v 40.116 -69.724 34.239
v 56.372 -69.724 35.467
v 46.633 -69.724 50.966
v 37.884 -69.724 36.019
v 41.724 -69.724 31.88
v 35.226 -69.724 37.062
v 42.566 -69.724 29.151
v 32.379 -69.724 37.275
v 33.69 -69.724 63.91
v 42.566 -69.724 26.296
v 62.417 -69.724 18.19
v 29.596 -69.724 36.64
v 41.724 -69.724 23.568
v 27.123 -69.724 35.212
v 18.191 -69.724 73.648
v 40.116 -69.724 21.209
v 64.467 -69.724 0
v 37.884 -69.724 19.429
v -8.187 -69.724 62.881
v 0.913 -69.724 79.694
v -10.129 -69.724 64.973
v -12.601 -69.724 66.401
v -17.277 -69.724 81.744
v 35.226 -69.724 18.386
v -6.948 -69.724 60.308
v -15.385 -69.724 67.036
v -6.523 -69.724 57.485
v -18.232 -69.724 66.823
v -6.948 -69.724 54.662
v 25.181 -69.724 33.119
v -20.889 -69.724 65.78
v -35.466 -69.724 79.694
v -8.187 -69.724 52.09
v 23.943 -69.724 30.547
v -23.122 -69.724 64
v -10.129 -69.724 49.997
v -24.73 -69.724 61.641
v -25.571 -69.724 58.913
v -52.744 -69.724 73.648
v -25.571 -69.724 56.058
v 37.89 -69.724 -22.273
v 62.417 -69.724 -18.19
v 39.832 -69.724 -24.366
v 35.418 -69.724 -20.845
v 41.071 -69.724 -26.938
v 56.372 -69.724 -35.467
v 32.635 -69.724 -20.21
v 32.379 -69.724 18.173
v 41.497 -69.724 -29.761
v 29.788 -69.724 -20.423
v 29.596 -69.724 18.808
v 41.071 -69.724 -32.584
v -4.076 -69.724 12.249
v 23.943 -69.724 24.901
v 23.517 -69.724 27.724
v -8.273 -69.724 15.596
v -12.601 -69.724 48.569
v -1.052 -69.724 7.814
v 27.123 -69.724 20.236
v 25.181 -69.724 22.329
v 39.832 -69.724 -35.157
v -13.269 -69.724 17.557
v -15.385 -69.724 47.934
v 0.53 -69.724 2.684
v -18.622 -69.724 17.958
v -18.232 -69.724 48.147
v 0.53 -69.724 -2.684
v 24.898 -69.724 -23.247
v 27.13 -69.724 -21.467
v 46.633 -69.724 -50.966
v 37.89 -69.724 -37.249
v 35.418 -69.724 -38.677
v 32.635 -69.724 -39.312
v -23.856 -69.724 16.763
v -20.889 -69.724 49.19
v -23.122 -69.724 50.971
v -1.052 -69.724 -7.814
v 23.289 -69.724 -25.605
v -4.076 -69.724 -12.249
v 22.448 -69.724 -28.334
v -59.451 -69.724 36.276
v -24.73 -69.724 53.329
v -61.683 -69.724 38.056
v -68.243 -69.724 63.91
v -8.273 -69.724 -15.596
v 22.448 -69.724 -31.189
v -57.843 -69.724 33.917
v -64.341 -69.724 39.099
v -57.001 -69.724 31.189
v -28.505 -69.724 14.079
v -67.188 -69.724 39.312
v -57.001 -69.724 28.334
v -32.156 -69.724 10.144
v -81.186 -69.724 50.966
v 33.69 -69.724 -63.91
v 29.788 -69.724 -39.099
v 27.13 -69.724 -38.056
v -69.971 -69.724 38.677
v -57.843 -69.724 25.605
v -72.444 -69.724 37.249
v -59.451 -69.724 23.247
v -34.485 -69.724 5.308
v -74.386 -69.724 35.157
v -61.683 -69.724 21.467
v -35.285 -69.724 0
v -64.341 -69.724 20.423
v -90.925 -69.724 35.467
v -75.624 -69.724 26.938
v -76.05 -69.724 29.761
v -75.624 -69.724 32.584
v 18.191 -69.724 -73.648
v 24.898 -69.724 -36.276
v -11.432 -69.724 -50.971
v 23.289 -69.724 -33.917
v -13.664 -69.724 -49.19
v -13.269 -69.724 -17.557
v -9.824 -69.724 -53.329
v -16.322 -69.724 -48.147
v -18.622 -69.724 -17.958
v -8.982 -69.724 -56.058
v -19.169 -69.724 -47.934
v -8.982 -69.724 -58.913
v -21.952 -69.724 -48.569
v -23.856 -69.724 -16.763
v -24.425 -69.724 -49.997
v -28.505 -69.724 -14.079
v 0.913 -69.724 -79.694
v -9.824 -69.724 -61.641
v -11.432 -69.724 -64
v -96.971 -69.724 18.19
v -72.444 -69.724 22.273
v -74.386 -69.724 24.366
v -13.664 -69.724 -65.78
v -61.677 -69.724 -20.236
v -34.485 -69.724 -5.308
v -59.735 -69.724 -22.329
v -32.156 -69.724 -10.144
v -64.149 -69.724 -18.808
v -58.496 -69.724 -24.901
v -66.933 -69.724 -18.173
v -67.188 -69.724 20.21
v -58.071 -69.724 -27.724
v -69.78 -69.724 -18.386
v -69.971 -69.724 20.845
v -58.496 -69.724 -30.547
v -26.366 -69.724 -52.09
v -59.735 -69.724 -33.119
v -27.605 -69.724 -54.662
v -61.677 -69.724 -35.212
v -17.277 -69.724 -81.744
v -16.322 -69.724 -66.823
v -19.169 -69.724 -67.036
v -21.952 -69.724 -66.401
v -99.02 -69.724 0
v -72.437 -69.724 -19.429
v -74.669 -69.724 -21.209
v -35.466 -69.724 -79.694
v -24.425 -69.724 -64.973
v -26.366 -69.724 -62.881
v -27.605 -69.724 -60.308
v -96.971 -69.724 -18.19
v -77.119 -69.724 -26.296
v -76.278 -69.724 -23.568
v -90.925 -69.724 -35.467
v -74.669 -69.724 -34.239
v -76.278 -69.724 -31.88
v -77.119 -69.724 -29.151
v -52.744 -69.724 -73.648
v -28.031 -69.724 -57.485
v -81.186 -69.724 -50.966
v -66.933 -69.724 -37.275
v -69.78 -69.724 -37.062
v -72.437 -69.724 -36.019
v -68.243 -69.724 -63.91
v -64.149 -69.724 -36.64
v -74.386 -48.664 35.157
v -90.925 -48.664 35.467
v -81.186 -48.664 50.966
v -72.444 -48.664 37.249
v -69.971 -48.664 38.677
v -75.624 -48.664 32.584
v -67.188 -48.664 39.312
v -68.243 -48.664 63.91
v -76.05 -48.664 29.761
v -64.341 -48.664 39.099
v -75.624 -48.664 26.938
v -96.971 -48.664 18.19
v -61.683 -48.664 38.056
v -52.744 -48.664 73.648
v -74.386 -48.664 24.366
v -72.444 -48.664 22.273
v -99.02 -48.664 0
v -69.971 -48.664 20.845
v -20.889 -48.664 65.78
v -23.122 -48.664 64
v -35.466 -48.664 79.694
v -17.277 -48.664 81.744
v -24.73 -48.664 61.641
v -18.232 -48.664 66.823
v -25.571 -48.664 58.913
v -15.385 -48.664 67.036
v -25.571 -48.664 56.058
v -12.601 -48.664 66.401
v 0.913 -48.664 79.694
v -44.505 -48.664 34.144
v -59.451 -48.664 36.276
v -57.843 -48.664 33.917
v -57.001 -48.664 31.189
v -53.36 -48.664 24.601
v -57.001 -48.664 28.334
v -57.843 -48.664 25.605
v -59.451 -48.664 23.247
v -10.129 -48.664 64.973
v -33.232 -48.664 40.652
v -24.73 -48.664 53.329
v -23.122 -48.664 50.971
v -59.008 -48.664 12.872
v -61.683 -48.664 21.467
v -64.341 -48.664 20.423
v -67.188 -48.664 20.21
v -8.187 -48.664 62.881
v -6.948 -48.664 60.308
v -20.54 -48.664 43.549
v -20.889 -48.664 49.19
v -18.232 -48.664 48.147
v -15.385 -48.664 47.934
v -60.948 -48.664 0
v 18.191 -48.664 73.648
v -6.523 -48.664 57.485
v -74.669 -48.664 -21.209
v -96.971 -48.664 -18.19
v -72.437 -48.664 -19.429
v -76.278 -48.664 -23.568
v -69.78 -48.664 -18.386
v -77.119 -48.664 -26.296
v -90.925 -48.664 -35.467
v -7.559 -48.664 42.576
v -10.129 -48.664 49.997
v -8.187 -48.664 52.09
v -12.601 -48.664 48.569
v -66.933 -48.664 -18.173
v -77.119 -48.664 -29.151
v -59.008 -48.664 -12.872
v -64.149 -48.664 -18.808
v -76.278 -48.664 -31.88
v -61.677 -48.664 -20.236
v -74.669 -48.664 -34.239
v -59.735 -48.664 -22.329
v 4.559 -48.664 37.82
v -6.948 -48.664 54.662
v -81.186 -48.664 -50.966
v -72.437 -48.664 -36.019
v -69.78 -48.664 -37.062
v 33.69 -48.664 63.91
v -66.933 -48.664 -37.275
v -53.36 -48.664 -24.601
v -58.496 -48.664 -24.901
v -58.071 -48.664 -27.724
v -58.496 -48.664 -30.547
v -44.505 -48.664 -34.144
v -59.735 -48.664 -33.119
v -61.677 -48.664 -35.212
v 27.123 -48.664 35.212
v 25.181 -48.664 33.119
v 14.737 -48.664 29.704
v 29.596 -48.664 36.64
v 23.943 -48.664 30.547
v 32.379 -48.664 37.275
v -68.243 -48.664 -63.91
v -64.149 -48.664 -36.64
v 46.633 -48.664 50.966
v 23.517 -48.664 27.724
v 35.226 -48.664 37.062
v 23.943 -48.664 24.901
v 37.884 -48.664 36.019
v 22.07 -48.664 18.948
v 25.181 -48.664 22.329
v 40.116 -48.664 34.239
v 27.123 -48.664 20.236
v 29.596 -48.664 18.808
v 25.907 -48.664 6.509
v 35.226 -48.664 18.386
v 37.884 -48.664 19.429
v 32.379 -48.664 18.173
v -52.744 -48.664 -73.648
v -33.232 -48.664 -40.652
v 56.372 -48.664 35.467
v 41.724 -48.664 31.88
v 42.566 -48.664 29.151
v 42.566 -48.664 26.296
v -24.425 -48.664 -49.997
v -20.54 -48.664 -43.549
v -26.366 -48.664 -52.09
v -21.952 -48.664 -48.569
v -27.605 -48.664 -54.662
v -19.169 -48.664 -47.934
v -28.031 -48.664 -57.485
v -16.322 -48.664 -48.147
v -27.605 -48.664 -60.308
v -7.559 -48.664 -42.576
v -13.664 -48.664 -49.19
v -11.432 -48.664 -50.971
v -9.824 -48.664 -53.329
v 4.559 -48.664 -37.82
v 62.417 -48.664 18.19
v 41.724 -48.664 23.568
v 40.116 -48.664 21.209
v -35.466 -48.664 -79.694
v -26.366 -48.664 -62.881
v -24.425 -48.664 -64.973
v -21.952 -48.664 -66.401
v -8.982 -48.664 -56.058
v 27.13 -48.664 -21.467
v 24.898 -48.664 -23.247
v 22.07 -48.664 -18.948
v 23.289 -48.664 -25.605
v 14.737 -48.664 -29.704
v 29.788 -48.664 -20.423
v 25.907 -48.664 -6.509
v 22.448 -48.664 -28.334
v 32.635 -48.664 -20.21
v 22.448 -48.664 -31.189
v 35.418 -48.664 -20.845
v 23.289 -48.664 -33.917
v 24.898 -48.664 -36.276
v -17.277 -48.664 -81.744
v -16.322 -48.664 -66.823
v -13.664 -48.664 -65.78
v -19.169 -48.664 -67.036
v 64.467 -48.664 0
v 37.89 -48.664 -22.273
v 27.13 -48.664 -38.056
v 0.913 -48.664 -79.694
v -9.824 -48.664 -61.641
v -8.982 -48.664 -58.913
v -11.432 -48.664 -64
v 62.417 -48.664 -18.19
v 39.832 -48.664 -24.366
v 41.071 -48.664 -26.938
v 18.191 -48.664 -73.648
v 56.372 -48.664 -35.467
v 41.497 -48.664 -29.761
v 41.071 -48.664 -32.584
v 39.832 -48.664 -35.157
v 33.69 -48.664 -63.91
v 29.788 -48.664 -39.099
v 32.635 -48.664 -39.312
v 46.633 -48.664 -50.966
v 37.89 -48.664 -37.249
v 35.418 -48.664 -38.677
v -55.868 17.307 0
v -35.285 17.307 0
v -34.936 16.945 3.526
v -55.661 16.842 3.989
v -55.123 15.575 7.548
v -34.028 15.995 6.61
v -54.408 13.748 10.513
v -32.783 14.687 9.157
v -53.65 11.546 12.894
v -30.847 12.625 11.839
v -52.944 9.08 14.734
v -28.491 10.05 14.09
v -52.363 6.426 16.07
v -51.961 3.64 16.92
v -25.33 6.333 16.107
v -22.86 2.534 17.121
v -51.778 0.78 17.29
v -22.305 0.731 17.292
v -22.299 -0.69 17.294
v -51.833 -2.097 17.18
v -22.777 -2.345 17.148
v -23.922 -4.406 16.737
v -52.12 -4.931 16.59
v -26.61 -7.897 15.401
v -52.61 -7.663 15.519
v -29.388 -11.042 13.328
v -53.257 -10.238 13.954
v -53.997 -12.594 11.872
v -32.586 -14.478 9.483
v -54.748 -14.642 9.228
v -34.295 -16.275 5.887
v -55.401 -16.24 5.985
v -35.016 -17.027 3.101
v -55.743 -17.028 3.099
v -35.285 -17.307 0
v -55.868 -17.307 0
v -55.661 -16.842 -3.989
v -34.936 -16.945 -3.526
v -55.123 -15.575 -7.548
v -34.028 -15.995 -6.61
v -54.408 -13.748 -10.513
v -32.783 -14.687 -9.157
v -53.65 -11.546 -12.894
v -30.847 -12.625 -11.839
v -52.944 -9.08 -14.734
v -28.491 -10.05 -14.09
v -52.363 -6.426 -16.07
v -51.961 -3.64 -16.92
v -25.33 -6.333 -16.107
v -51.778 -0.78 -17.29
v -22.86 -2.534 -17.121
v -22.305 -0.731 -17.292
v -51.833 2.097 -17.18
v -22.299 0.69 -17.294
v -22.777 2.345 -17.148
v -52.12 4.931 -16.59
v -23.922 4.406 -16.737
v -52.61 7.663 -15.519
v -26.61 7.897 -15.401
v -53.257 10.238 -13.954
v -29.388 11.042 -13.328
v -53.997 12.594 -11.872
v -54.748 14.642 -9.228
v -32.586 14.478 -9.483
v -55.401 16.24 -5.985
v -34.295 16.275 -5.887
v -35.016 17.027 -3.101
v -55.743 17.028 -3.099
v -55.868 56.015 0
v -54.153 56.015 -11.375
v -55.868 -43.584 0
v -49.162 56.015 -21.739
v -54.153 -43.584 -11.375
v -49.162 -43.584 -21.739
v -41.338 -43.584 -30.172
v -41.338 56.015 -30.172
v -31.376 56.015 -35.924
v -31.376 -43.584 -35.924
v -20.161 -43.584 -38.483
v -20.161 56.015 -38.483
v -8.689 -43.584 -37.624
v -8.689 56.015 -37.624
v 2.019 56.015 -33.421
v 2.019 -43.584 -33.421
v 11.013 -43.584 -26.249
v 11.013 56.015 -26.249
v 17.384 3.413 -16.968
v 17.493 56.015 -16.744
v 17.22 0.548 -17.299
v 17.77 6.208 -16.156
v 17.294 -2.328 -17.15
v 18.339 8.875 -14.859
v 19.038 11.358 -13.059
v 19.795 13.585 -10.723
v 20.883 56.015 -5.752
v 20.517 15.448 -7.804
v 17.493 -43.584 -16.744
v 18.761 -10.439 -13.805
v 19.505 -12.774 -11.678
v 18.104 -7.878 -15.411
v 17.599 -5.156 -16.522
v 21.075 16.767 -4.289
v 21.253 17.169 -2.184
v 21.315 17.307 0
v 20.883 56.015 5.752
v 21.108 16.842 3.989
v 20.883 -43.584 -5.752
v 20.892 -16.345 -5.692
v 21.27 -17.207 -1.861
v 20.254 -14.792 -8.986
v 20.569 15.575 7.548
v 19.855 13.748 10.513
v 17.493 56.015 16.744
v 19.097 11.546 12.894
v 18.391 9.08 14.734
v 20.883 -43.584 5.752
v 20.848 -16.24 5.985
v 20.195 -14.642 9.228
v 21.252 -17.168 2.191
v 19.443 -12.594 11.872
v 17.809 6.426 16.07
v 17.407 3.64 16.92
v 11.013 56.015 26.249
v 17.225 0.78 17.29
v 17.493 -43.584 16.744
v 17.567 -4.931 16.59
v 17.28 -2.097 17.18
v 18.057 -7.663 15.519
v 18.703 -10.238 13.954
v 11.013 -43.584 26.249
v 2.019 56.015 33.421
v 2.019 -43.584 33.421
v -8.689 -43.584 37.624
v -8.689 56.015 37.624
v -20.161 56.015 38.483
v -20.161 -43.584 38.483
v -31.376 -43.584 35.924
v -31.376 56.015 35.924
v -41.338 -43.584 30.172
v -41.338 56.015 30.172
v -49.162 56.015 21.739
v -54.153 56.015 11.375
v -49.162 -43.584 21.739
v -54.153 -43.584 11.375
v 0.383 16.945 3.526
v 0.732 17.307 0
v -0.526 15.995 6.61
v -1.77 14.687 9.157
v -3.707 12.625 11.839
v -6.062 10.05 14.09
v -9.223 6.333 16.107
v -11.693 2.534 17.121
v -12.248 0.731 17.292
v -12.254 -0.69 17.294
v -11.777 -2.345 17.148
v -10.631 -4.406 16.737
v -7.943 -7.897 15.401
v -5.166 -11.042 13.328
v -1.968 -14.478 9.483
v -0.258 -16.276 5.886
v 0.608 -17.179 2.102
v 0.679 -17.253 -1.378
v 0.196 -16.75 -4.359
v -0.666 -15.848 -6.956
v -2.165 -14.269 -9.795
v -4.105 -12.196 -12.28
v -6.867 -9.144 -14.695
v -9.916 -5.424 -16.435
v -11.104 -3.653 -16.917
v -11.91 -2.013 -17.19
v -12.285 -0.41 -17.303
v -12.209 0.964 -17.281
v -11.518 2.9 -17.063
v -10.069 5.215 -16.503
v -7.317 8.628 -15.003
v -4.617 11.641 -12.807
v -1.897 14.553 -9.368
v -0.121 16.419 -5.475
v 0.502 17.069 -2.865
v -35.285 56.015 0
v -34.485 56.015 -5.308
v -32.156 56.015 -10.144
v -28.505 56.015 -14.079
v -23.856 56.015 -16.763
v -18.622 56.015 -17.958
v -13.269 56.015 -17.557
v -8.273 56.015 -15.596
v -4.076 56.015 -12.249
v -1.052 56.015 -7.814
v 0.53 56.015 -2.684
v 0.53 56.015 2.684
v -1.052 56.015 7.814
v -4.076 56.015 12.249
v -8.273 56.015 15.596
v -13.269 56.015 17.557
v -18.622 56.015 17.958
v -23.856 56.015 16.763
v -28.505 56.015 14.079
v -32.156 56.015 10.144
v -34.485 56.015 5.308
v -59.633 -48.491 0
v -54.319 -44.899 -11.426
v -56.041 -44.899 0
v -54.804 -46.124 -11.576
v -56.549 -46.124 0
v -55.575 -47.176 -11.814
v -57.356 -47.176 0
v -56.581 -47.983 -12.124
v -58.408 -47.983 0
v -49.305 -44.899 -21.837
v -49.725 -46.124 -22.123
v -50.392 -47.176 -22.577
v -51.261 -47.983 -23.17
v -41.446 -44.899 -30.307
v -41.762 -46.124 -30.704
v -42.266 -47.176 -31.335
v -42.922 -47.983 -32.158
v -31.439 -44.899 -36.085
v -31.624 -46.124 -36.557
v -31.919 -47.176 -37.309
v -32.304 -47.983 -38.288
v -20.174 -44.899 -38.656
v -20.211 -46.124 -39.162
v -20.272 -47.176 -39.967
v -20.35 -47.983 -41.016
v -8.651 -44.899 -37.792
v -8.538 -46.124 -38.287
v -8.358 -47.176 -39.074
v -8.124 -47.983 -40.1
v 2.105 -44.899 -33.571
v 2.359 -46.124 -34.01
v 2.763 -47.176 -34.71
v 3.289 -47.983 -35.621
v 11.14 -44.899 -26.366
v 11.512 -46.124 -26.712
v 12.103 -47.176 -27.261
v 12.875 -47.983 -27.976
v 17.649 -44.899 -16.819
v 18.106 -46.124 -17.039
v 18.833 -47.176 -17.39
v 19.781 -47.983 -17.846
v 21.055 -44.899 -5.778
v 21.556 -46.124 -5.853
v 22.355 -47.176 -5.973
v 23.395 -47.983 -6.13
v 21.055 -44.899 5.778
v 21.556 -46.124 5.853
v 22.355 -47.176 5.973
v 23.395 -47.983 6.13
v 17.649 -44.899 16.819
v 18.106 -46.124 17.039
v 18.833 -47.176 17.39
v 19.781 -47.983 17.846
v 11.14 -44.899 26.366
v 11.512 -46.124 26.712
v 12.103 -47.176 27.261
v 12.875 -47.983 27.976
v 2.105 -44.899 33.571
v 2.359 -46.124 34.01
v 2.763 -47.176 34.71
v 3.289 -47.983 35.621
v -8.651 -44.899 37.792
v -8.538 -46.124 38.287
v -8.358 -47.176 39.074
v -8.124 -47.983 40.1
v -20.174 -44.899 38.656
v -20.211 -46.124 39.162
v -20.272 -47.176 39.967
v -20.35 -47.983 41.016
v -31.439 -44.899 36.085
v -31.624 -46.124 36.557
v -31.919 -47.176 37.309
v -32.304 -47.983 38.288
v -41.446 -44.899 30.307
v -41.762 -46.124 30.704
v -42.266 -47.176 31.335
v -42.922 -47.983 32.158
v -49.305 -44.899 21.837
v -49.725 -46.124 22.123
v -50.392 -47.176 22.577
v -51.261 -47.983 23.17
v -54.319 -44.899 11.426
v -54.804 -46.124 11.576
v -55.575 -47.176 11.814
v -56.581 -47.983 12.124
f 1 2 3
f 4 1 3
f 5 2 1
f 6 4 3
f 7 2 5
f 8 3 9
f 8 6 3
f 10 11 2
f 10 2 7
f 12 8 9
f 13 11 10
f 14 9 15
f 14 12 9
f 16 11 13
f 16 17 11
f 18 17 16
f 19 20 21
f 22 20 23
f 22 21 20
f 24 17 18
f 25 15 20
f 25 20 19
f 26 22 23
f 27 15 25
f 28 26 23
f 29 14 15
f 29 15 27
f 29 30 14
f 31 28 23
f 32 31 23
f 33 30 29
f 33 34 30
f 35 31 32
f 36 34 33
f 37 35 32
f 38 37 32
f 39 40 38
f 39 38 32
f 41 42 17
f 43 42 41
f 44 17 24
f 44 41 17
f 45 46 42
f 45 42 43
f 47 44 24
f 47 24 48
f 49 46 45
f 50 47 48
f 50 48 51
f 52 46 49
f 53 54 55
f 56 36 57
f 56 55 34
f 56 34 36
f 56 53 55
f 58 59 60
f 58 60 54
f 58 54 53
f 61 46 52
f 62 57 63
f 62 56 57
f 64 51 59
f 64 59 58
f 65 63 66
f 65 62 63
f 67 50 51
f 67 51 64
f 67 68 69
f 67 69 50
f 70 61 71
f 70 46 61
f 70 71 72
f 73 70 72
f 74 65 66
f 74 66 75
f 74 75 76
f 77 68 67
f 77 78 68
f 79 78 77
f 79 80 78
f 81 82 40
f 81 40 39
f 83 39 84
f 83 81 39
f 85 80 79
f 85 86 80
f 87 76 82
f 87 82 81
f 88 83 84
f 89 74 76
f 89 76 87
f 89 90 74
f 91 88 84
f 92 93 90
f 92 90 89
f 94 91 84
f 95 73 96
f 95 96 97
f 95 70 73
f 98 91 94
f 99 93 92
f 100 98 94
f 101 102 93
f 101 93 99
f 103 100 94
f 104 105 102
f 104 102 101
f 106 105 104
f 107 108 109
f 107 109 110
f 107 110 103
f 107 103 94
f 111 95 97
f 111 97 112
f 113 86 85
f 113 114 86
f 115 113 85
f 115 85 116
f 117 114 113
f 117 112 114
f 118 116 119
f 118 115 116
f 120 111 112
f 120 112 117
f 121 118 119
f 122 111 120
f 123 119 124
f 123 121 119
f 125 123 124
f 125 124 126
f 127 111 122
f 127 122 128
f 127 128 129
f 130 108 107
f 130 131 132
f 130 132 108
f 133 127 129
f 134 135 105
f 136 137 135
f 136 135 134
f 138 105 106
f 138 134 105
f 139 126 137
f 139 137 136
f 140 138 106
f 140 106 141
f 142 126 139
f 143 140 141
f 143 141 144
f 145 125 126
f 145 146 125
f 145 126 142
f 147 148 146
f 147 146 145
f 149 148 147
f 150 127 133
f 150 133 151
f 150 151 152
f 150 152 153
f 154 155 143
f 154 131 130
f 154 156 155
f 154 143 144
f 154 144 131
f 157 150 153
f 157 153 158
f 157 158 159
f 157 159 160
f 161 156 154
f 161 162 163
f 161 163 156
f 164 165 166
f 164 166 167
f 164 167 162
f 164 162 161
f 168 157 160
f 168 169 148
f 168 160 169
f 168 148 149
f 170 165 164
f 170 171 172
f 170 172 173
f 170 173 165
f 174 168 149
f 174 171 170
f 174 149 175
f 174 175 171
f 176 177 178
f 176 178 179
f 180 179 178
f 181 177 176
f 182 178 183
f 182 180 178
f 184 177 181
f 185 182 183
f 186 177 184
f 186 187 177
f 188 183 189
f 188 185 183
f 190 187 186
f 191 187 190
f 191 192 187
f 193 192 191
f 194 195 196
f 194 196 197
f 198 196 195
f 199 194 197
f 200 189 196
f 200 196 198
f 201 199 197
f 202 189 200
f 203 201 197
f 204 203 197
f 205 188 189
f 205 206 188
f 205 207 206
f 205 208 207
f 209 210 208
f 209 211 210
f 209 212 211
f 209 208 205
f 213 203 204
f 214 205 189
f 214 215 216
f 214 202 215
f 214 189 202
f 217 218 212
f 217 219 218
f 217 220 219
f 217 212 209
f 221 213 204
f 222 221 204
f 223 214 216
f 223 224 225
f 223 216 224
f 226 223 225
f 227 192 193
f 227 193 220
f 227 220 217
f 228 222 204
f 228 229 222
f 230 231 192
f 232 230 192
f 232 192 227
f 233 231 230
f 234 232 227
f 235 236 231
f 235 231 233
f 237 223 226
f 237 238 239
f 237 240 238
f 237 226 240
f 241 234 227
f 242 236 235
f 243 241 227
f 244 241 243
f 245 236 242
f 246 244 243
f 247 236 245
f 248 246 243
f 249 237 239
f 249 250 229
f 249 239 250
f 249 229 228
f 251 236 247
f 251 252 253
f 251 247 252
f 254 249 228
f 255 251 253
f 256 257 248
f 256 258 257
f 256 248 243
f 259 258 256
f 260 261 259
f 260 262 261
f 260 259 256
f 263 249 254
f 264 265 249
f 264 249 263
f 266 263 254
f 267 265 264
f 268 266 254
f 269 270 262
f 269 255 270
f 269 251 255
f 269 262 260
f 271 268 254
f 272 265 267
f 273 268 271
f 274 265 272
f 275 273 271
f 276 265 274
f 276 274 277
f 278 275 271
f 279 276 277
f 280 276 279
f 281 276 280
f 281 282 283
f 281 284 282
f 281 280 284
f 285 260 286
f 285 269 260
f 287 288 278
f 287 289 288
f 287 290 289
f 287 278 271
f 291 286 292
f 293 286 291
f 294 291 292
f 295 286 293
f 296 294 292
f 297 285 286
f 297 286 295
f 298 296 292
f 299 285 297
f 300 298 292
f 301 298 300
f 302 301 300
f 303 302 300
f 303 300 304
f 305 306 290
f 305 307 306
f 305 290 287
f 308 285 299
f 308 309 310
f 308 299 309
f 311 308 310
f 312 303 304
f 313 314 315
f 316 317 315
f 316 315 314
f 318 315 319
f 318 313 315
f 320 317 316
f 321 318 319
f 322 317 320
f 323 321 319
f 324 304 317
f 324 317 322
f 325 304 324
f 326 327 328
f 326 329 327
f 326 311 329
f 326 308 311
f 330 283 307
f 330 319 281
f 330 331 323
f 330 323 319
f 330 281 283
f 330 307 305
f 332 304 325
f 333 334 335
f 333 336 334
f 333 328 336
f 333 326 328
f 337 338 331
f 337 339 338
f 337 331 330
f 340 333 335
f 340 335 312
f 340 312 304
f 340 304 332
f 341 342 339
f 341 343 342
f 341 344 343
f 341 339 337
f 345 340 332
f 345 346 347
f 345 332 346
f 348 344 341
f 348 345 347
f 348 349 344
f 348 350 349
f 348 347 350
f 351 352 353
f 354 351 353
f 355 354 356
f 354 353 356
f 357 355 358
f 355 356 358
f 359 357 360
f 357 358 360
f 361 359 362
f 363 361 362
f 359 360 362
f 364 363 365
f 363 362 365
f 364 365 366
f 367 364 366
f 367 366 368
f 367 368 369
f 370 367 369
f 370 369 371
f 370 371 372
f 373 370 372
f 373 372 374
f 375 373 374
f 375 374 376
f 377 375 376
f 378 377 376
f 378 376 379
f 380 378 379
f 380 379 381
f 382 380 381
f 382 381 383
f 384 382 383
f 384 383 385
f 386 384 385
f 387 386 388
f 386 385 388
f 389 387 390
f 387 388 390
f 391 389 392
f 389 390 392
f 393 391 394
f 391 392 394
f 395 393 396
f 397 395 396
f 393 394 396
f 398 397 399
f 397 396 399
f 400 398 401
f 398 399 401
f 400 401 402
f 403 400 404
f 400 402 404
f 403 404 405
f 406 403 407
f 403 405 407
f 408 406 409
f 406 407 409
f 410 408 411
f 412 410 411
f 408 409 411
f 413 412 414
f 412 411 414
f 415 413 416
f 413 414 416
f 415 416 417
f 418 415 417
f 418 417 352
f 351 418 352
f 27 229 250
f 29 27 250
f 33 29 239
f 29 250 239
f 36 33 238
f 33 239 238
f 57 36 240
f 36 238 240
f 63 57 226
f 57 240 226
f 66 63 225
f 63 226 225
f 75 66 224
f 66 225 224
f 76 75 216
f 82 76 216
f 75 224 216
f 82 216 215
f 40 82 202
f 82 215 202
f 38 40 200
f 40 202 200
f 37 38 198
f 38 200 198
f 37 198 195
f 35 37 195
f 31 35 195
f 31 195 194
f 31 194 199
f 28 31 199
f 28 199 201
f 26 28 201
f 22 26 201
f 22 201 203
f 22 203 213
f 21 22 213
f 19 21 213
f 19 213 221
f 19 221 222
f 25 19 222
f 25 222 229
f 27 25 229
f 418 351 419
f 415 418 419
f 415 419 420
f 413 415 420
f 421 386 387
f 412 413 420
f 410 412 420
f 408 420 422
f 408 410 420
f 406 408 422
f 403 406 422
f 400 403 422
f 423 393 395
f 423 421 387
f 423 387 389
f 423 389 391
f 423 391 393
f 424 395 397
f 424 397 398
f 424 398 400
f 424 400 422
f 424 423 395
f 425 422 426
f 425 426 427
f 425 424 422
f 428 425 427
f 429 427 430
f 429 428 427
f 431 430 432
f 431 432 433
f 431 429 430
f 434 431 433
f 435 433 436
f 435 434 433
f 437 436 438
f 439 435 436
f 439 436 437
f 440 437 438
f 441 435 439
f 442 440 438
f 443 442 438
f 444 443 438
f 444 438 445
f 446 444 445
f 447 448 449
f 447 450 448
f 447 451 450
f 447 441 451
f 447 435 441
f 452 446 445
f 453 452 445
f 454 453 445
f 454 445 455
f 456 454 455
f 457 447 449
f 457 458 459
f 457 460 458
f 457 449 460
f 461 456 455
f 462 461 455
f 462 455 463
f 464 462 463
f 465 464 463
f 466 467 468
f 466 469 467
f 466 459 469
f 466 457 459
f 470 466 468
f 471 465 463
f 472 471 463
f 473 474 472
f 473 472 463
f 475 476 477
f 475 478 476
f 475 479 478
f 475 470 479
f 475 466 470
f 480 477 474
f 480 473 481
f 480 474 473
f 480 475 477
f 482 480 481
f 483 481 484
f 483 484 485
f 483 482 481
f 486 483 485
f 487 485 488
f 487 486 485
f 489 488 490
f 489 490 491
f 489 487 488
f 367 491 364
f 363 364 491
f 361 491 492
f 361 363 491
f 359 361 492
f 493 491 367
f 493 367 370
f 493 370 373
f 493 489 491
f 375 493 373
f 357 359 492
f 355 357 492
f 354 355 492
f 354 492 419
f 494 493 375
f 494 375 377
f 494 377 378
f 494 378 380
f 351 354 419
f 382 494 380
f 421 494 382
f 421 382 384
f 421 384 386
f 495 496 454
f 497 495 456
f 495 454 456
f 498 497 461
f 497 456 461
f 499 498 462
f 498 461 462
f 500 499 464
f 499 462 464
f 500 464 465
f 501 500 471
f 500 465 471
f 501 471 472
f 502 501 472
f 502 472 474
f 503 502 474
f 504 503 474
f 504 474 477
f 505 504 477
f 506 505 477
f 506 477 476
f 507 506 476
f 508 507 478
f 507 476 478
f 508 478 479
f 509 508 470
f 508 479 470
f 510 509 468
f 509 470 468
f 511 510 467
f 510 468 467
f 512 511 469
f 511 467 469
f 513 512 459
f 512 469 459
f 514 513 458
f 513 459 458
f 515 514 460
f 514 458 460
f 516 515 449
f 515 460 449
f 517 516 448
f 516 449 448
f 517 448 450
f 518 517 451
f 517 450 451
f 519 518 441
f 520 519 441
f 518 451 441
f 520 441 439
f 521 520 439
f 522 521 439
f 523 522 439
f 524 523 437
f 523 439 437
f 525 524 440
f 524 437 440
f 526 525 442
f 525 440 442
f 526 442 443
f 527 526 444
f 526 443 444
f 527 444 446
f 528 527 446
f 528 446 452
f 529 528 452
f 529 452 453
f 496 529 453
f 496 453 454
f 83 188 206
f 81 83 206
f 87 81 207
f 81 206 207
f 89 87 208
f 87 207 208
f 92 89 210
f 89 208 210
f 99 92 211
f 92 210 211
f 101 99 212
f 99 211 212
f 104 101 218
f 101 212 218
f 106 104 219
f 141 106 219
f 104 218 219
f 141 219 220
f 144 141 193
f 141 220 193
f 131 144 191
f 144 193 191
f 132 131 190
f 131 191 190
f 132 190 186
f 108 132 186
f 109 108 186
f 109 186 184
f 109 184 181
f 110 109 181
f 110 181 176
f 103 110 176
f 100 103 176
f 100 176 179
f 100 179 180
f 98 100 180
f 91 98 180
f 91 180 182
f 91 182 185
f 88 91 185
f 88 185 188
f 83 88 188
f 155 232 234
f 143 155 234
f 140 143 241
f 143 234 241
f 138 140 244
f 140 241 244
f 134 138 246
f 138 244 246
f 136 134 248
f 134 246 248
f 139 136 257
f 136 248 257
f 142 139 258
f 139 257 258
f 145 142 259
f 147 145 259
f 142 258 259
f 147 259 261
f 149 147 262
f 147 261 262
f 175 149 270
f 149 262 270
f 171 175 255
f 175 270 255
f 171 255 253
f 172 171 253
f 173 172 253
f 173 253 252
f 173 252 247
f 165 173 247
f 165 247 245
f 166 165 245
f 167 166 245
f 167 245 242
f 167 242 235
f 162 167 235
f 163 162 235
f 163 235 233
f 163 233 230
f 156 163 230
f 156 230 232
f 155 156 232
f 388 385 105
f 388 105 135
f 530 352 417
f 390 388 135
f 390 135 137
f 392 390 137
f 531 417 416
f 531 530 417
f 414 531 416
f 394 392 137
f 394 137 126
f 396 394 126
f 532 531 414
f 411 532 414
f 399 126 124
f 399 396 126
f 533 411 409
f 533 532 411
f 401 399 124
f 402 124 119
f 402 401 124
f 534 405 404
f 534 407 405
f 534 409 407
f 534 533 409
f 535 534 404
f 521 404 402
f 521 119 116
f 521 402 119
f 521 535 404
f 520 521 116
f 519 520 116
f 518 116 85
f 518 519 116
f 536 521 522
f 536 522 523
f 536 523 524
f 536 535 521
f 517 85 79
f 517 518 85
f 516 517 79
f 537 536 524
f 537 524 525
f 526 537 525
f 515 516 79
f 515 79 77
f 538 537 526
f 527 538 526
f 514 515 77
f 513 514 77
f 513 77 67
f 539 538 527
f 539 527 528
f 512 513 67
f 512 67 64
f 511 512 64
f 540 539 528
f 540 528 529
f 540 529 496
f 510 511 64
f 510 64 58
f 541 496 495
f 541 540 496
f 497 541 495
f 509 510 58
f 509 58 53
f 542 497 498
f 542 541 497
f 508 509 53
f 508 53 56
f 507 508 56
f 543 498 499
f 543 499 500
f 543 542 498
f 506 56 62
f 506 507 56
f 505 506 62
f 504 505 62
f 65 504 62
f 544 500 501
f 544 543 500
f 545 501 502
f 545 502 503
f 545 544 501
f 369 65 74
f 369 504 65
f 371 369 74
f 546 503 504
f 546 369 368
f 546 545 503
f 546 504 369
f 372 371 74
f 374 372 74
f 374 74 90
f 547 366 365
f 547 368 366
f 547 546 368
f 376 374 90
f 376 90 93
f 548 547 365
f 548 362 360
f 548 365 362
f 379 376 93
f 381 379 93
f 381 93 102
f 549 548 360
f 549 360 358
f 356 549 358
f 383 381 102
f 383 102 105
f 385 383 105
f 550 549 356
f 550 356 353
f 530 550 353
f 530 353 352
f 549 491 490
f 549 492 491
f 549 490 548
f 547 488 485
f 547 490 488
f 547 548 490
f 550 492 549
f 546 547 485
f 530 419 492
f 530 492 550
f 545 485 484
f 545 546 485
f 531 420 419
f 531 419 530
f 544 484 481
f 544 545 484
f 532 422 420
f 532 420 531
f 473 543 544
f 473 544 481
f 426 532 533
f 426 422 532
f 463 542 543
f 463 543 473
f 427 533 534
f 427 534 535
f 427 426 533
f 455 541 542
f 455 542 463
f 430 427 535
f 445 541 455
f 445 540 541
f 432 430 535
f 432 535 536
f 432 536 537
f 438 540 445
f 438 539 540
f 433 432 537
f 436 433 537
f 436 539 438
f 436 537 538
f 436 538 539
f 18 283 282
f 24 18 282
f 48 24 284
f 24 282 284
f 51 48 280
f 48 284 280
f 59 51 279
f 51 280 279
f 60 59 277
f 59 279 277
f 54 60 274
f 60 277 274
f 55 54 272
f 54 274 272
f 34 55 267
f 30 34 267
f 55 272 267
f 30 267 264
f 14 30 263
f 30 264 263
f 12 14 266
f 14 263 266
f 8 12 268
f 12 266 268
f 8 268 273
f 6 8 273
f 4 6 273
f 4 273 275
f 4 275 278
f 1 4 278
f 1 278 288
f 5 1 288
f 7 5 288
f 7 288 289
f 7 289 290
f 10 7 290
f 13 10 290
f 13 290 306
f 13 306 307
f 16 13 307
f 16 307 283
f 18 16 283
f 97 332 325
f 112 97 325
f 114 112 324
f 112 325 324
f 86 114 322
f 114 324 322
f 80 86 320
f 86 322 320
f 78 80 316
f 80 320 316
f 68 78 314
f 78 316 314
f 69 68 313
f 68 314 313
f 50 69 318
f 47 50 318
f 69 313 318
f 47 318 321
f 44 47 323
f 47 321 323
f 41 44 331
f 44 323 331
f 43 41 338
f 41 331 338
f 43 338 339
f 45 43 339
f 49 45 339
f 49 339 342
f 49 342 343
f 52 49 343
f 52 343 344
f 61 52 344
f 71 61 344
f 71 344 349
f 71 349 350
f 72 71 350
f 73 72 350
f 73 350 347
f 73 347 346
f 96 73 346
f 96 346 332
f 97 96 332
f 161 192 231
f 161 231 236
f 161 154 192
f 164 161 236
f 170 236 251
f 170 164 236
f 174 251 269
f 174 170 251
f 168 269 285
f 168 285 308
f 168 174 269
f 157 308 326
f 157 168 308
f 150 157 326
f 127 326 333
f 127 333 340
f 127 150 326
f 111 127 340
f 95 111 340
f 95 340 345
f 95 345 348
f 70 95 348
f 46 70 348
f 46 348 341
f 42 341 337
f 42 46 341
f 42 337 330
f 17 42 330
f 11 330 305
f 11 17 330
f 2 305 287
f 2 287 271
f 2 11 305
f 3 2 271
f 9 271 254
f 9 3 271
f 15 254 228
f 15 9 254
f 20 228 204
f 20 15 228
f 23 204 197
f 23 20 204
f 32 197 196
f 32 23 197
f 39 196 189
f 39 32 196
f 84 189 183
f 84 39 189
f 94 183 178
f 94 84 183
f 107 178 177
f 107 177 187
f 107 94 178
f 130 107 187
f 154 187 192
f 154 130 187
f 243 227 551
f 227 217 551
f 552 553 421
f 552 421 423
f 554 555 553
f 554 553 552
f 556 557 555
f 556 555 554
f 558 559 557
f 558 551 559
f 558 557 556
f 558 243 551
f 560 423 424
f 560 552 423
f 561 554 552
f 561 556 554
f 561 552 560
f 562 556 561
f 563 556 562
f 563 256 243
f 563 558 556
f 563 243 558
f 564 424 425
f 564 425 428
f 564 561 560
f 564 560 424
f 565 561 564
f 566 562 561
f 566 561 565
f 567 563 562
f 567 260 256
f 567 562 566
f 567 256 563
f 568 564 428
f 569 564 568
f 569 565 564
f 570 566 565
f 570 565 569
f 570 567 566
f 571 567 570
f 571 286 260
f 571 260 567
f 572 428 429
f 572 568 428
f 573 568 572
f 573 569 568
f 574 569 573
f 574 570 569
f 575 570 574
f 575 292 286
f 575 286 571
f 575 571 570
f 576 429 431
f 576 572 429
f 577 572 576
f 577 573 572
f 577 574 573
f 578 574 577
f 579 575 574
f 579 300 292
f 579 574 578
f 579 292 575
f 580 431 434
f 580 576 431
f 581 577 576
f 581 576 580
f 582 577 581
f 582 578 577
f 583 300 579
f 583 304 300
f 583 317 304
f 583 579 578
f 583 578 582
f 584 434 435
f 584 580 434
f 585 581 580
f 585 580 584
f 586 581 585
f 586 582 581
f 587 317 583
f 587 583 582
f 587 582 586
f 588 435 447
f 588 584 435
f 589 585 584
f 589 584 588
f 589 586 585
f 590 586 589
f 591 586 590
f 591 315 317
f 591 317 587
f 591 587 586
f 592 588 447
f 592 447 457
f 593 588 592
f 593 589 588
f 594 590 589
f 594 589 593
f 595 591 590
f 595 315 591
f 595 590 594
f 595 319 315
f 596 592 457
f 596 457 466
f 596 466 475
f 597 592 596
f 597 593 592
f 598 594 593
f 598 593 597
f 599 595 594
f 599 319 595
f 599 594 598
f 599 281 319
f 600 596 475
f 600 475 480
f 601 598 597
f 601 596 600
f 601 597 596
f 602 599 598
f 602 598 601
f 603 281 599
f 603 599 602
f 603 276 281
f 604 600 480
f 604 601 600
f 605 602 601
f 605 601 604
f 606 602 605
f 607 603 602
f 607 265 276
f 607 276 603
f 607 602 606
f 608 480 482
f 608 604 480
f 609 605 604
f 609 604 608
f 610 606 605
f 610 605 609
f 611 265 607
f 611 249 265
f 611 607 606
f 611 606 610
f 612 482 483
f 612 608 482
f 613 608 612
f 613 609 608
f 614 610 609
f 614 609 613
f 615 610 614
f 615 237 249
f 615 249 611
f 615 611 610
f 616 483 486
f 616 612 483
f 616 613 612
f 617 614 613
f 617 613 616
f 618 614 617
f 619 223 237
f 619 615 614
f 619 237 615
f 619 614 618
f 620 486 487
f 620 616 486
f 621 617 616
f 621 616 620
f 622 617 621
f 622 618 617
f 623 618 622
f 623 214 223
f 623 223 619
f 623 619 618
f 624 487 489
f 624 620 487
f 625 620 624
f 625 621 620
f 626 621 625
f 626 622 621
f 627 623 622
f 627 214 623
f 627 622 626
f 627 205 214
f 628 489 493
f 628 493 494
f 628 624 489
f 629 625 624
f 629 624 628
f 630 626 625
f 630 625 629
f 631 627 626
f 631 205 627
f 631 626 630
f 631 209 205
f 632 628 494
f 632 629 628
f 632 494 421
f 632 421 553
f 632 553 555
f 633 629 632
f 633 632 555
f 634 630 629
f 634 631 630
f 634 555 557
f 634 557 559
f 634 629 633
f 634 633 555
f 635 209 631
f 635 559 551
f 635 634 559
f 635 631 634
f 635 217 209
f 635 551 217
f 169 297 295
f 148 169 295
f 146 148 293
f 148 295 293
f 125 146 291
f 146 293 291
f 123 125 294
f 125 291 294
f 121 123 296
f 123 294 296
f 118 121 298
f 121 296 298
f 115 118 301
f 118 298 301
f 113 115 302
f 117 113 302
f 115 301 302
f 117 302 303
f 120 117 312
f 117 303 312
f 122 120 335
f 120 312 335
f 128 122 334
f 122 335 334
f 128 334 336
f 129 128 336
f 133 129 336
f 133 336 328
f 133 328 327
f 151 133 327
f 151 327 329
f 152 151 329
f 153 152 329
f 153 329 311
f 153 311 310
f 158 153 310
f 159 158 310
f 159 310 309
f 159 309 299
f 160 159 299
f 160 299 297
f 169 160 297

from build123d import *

# Parameters (mm, degrees)
F2_R            = 9.5778194828
F3_DEPTH        = 25.4
F3_COPIES_COUNT = 6
F4_R            = 5.08
F5_R            = 17.307456635
F6_DEPTH        = 70.104


# Not quite as in the source:
# - a pattern or mirror of a feature is missing from the dataset's text; its kind, count and spacing are read off the source's solid


with BuildPart() as f1:
    # F0 (on Top) → F1 (revolve)
    with BuildSketch(Plane.XY):
        Polygon((-35.2849960327, 56.0149177909), (-55.8679103851, 56.0149177909), (-55.8679103851, -48.6638955772), (-99.0202575922, -48.6638955772), (-99.0202575922, -69.7239711881), (-35.2849960327, -69.7239711881), (-35.2849960327, -48.6638955772), align=None)
    revolve(axis=Axis((-17.2766894102, -6.7990683019, 0), (0, -1, 0)))

    # F2 (on face) → F3 (cut)
    with BuildSketch(Plane(origin=(0, -48.6638955772, 0), x_dir=(-1, 0, 0), z_dir=(0, 1, 0))):
        with Locations((18.4528566897, -57.4851334095)):
            Circle(F2_R)
    f3 = extrude(amount=-F3_DEPTH, mode=Mode.SUBTRACT)

    # F3_copies: F3 ×6 about axis
    f3_copies_axis = Axis((-17.276689, 0, 0), (0, 1, 0))
    for i in range(1, F3_COPIES_COUNT):
        add(f3.rotate(f3_copies_axis, i * 360 / F3_COPIES_COUNT), mode=Mode.SUBTRACT)

    # F4
    f4_edges = [f1.edges().sort_by_distance(p)[0] for p in [
        (21.314532, -48.663896, 0),
    ]]
    fillet(f4_edges, radius=F4_R)

    # F5 (on Right) → F6 (cut, symmetric)
    with BuildSketch(Plane.YZ):
        Circle(F5_R)
    extrude(amount=F6_DEPTH, both=True, mode=Mode.SUBTRACT)


solid = f1.part
